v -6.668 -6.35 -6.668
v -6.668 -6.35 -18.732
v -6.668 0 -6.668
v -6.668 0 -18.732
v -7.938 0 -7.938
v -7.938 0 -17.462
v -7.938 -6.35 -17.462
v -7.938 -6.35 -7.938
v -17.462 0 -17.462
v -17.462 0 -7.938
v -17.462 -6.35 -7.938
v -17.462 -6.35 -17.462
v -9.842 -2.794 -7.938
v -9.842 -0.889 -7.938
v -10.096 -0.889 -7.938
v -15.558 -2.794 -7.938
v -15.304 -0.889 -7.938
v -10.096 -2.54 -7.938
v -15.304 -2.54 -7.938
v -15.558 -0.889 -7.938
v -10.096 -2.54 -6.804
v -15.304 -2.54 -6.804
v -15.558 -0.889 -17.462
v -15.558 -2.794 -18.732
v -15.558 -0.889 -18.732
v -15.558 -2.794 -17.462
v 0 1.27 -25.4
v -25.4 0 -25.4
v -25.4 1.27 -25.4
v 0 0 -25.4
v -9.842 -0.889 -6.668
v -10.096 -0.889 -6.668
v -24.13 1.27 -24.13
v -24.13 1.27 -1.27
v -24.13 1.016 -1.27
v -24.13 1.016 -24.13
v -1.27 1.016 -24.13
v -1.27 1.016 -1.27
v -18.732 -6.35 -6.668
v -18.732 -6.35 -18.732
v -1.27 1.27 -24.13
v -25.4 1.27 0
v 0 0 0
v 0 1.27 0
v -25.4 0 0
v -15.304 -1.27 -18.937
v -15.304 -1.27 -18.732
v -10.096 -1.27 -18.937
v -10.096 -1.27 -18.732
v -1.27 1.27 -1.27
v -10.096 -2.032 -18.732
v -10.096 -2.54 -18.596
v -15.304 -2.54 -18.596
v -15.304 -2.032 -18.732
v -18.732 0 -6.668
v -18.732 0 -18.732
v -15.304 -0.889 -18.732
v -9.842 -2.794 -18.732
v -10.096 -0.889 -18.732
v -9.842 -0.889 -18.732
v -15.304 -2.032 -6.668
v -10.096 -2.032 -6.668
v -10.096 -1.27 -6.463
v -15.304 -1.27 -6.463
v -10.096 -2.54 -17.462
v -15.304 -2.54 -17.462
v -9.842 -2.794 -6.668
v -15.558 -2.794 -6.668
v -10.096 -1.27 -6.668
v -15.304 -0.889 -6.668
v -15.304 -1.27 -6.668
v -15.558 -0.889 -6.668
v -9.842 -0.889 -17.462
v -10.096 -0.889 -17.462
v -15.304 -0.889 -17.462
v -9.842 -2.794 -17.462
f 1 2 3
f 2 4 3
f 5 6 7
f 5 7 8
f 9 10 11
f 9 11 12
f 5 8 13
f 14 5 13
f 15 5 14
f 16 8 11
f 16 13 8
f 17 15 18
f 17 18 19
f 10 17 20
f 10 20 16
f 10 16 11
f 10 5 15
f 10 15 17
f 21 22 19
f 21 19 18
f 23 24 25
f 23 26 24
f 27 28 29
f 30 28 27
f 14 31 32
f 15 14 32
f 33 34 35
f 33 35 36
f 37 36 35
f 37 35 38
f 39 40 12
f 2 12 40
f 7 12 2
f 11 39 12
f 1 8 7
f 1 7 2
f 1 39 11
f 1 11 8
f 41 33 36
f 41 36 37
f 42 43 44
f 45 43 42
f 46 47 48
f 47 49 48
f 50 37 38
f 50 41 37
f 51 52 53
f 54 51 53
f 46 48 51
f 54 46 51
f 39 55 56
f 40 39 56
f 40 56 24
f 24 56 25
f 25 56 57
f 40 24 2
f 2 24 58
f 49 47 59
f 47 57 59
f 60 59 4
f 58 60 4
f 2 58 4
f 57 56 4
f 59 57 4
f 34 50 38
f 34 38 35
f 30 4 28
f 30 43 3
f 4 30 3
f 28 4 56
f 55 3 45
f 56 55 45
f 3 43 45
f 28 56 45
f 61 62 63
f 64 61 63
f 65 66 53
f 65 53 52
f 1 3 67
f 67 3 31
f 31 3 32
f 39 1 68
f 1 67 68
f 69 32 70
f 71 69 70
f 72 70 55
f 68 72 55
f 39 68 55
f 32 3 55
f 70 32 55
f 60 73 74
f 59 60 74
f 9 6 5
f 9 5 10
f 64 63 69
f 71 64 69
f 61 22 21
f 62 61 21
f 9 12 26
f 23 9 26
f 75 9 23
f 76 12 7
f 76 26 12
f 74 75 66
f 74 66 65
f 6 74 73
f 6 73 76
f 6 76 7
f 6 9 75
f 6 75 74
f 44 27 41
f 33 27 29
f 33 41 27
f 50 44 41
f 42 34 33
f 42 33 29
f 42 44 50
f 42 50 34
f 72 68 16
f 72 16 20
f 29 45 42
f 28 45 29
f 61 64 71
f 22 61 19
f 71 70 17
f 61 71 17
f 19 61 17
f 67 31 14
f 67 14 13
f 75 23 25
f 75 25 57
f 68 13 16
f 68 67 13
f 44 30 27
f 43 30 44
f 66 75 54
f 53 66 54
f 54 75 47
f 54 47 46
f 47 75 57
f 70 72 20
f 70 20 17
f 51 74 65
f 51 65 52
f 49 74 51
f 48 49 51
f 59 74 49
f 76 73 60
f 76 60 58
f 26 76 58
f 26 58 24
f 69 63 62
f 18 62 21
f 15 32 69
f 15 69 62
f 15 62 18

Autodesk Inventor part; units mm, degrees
ref_plane "YZ Plane" through (0, 0, 0) normal (1, 0, 0) x (0, 1, 0)
ref_plane "XZ Plane" through (0, 0, 0) normal (0, 1, 0) x (-1, 0, 0)
ref_plane "XY Plane" through (0, 0, 0) normal (0, 0, 1) x (1, 0, 0)
sketch "Sketch1" plane through (0, 0, 0) normal (0, 1, 0) x (-1, 0, 0)
  line L0 (0, 0) -> (25.4, 0)
  line L1 (25.4, 0) -> (25.4, -25.4)
  line L2 (25.4, -25.4) -> (0, -25.4)
  line L3 (0, -25.4) -> (0, 0)
  dimension "d0" = 25.4
  dimension "d1" = 25.4
extrude "Extrusion1" add sketch "Sketch1" along normal blind 1.27
sketch "Sketch2" plane through (0, 0, 0) normal (0, -1, 0) x (1, 0, 0)
  line L0 (-6.6675, -6.6675) -> (-18.7325, -6.6675)
  line L1 (-18.7325, -6.6675) -> (-18.7325, -18.7325)
  line L2 (-18.7325, -18.7325) -> (-6.6675, -18.7325)
  line L3 (-6.6675, -18.7325) -> (-6.6675, -6.6675)
  line L4 (0, 0) -> (0, -25.4) projected
  line L5 (0, -25.4) -> (-25.4, -25.4) projected
  line L6 (-7.9375, -7.9375) -> (-17.4625, -7.9375)
  line L7 (-17.4625, -7.9375) -> (-17.4625, -17.4625)
  line L8 (-17.4625, -17.4625) -> (-7.9375, -17.4625)
  line L9 (-7.9375, -17.4625) -> (-7.9375, -7.9375)
  point P0 (-6.6675, -12.7)
  point P1 (0, -12.7)
  point P2 (-12.7, -18.7325)
  point P3 (-12.7, -25.4)
  dimension "d4" = 12.065
  dimension "d6" = 1.27
extrude "Extrusion2" add sketch "Sketch2" along normal blind 6.35
sketch "Sketch3" plane through (-18.7325, 0, -6.6675) normal (0, 0, 1) x (1, 0, 0)
  line L0 (3.175, -2.54) -> (8.89, -2.54)
  line L1 (8.89, -2.54) -> (8.89, -2.794)
  line L2 (8.89, -2.794) -> (3.175, -2.794)
  line L3 (3.175, -2.794) -> (3.175, -2.54)
  line L4 (12.065, -6.35) -> (0, -6.35) projected
  line L5 (-6.6675, 0) -> (18.7325, 0) projected
  line L6 (3.175, -0.889) -> (3.429, -0.889)
  line L7 (3.429, -0.889) -> (3.429, -2.794)
  line L8 (3.429, -2.794) -> (3.175, -2.794)
  line L9 (3.175, -2.794) -> (3.175, -0.889)
  line L10 (6.0325, -2.794) -> (6.0325, -2.54) construction
  line L11 (8.89, -0.889) -> (8.636, -0.889)
  line L12 (8.636, -0.889) -> (8.636, -2.794)
  line L13 (8.89, -2.794) -> (8.89, -0.889)
  point P0 (6.0325, -6.35)
  point P1 (8.636, -2.54)
  point P2 (3.429, -2.54)
  dimension "d9" = 0.254
  dimension "d10" = 5.715
  dimension "d11" = 2.54
  dimension "d14" = 0.254
  dimension "d15" = 1.905
extrude "Extrusion3" cut sketch "Sketch3" against normal through all
chamfer "Chamfer1" distance 0.508 angle 15 1 edges at (-12.7, -2.54, -6.6675) measured on face at (-13.6525, -5.1647, -6.6675)
sketch "Sketch4" plane through (-10.0965, -2.54, -7.9375) normal (1, 0, 0) x (0, 0, -1)
  line L0 (-1.27, 0.508) -> (-1.1339, 0) projected
  line L1 (-1.27, 0.508) -> (-1.27, 1.27)
  line L2 (-1.27, 0.508) -> (-1.4742, 1.27)
  line L3 (-1.4742, 1.27) -> (-1.27, 1.27)
  line L4 (-1.27, 1.651) -> (0, 1.651) construction
  line L5 (-1.27, 1.651) -> (-1.27, 1.27) construction
  line L6 (-1.27, 0.508) -> (-1.27, 1.651) construction
  point P0 (-7.9375, 2.54)
  dimension "d22" = 0.381
extrude "Extrusion4" add sketch "Sketch4" against normal up to surface (5.207 mm away)
ref_plane "Work Plane1" through (-18.7325, 0, -12.7) normal (0, 0, 1) x (1, 0, 0)
chamfer "Chamfer2" distance 0.508 angle 15 1 edges at (-12.7, -2.54, -18.7325) measured on face at (-11.7475, -5.1647, -18.7325)
mirror "Mirror2" about plane through (-18.7325, 0, -12.7) normal (0, 0, 1) of "Extrusion4"
sketch "Sketch5" plane through (0, 1.27, 0) normal (0, 1, 0) x (1, 0, 0)
  line L0 (0, 25.4) -> (-25.4, 25.4) projected
  line L1 (-25.4, 25.4) -> (-25.4, 0) projected
  line L2 (-25.4, 0) -> (0, 0) projected
  line L3 (0, 0) -> (0, 25.4) projected
  line L4 (-24.13, 1.27) -> (-24.13, 24.13)
  line L5 (-24.13, 24.13) -> (-1.27, 24.13)
  line L6 (-1.27, 24.13) -> (-1.27, 1.27)
  line L7 (-1.27, 1.27) -> (-24.13, 1.27)
  dimension "d26" = 1.27
extrude "Extrusion5" cut sketch "Sketch5" against normal blind 0.254 contours L4 L5 L6 L7
